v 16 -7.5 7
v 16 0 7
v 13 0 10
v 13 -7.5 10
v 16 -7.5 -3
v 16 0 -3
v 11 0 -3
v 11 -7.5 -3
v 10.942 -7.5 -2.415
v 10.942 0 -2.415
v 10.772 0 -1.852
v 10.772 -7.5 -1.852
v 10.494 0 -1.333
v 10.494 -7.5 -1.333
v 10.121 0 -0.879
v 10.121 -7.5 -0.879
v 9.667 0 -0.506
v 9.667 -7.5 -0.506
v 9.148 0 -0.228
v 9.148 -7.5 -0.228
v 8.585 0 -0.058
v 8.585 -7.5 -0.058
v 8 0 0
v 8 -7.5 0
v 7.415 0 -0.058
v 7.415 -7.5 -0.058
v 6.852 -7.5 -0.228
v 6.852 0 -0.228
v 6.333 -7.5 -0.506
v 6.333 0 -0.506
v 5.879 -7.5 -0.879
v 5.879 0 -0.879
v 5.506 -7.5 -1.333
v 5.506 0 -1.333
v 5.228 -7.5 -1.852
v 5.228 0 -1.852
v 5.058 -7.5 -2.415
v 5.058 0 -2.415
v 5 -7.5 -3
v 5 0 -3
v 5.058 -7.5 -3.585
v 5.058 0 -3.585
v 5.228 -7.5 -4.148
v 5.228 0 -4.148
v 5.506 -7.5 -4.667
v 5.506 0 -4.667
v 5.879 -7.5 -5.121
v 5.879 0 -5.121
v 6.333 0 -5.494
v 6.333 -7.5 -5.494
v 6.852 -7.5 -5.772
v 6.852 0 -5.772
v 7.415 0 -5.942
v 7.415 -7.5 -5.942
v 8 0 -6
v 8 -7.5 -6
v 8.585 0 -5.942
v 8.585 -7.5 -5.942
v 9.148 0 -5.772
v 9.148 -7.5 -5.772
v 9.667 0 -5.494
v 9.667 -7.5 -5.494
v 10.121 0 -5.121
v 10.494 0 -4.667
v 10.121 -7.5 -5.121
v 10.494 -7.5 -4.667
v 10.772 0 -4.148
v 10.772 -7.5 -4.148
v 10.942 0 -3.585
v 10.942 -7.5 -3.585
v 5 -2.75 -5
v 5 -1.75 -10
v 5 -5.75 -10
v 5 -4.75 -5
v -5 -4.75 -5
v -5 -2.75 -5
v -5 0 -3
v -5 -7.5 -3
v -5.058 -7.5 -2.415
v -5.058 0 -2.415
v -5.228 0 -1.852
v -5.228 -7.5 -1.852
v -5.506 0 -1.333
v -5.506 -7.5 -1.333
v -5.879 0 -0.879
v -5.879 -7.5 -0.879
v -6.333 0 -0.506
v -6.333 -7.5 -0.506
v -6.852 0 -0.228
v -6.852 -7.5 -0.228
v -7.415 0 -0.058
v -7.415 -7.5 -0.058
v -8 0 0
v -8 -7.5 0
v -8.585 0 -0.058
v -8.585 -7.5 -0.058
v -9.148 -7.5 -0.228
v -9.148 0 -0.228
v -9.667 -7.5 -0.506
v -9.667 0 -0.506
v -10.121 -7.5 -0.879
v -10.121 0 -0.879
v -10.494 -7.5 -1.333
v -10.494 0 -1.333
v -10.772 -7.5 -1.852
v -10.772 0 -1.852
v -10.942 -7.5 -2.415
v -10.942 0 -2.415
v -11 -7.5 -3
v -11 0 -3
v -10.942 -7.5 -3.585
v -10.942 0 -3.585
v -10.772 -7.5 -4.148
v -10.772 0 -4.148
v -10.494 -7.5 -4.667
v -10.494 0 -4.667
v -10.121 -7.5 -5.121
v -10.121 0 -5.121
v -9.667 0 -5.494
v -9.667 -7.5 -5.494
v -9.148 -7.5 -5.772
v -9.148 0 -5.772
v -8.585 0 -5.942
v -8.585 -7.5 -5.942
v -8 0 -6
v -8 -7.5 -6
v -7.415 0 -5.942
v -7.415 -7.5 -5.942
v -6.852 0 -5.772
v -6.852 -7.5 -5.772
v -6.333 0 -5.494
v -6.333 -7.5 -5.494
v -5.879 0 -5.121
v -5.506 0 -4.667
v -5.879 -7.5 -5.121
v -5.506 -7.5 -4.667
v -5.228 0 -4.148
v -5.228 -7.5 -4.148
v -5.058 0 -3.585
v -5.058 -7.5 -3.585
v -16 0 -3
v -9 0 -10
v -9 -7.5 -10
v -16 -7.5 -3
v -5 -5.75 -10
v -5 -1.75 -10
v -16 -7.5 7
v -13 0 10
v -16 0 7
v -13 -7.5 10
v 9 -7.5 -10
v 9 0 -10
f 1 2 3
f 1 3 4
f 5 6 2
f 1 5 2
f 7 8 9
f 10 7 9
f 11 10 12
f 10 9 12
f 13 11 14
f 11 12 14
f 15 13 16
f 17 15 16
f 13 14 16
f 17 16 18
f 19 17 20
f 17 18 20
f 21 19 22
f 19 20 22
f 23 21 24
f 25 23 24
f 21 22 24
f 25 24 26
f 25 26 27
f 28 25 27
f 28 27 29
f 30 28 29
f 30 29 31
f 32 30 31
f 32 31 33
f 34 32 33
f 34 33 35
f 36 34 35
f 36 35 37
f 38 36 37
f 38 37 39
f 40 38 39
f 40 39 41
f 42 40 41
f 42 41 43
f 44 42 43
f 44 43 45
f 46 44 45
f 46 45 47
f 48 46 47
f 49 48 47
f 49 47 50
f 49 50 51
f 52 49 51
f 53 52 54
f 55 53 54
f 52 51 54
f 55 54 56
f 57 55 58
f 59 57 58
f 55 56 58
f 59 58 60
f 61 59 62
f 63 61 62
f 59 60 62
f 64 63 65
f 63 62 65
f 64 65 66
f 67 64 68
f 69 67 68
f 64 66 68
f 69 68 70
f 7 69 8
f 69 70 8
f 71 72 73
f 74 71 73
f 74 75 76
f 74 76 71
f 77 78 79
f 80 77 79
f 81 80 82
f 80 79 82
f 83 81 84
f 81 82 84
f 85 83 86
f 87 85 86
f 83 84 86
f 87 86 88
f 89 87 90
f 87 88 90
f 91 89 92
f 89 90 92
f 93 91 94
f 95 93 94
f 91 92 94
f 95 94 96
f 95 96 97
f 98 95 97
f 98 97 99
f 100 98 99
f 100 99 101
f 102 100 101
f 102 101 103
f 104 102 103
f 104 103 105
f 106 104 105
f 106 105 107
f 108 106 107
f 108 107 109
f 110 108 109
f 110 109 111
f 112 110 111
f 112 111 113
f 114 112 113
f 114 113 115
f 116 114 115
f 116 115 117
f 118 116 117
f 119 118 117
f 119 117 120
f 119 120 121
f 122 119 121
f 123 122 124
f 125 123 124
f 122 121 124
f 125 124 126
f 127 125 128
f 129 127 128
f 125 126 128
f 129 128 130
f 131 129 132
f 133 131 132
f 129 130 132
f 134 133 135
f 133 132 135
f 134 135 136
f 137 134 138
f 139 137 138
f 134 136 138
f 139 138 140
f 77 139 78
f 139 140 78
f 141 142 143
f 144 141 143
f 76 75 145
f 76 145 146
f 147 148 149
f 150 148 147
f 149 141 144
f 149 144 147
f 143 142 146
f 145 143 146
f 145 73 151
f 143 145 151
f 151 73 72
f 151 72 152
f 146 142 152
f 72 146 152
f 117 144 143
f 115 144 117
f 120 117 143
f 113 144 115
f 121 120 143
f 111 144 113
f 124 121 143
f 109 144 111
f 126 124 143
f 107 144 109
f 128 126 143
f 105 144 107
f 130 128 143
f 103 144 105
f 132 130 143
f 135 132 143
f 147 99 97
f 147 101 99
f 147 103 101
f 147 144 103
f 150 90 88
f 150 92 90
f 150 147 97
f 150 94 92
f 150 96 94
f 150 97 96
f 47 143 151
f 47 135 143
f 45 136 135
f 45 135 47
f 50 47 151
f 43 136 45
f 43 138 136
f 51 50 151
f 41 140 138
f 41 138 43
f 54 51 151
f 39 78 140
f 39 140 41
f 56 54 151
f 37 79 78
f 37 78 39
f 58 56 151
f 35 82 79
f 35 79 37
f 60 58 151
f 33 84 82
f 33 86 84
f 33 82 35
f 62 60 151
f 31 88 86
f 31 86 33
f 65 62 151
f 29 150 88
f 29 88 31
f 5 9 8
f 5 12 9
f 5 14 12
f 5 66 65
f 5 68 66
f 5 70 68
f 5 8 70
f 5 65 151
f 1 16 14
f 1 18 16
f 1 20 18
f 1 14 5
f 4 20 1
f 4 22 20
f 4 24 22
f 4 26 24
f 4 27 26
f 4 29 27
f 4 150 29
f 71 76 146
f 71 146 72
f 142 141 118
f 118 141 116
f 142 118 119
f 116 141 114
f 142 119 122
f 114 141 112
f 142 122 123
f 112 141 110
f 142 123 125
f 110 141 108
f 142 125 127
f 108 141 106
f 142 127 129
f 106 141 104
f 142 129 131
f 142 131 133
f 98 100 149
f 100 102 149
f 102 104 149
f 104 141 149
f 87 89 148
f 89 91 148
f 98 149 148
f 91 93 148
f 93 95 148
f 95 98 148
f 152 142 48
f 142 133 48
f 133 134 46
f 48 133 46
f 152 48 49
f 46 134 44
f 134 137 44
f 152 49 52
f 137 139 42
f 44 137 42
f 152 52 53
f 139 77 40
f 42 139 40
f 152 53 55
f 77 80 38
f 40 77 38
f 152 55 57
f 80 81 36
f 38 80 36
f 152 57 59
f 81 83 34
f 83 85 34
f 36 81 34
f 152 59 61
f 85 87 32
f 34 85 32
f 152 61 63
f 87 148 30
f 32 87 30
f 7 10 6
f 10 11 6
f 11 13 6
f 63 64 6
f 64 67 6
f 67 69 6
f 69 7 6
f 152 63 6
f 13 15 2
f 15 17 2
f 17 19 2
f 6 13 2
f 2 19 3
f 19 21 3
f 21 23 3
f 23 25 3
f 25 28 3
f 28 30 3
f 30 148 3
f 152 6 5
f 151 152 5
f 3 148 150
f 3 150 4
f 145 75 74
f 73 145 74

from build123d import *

# Parameters (mm, degrees)
F1_W     = 32
F1_H     = 20
F2_DEPTH = 7.5
F3_SIZE  = 7
F4_R     = 3
F5_DEPTH = 25
F6_SIZE  = 3
F7_W     = 10
F7_H     = 2
F8_DEPTH = 5
F9_SIZE2 = 0.99999
F9_SIZE  = 4.99999


# Not quite as in the source:
# - a fillet or chamfer is up to 0.001 mm smaller than in the source, because OpenCascade refuses the exact size


with BuildPart() as f2:
    # F1 (on Front) → F2 (new body)
    with BuildSketch(Plane.XZ):
        Rectangle(F1_W, F1_H)
    extrude(amount=F2_DEPTH)

    # F3
    f3_edges = [f2.edges().sort_by_distance(p)[0] for p in [
        (-16, -3.75, -10),
        (16, -3.75, -10),
    ]]
    chamfer(f3_edges, length=F3_SIZE)

    # F4 (on face) → F5 (cut)
    with BuildSketch(Plane.XZ.offset(7.5)):
        with Locations((-8, -3)):
            Circle(F4_R)
        with Locations((8, -3)):
            Circle(F4_R)
    extrude(amount=-F5_DEPTH, mode=Mode.SUBTRACT)

    # F6
    f6_edges = [f2.edges().sort_by_distance(p)[0] for p in [
        (16, -3.75, 10),
        (-16, -3.75, 10),
    ]]
    chamfer(f6_edges, length=F6_SIZE)

    # F7 (on face) → F8 (cut)
    with BuildSketch(Plane(origin=(0, 0, -10), x_dir=(1, 0, 0), z_dir=(0, 0, -1))):
        with Locations((0, 4.75)):
            Rectangle(F7_W, F7_H)
        with Locations((0, 2.75)):
            Rectangle(F7_W, F7_H)
    extrude(amount=-F8_DEPTH, mode=Mode.SUBTRACT)

    # F9 (size 5 and 1 in the source; OpenCascade refuses exactly that, so slightly less here)
    f9_edges = [f2.edges().sort_by_distance(p)[0] for p in [
        (0, -1.75, -5),
        (0, -5.75, -5),
    ]]
    chamfer(f9_edges, length=F9_SIZE, length2=F9_SIZE2)


solid = f2.part
